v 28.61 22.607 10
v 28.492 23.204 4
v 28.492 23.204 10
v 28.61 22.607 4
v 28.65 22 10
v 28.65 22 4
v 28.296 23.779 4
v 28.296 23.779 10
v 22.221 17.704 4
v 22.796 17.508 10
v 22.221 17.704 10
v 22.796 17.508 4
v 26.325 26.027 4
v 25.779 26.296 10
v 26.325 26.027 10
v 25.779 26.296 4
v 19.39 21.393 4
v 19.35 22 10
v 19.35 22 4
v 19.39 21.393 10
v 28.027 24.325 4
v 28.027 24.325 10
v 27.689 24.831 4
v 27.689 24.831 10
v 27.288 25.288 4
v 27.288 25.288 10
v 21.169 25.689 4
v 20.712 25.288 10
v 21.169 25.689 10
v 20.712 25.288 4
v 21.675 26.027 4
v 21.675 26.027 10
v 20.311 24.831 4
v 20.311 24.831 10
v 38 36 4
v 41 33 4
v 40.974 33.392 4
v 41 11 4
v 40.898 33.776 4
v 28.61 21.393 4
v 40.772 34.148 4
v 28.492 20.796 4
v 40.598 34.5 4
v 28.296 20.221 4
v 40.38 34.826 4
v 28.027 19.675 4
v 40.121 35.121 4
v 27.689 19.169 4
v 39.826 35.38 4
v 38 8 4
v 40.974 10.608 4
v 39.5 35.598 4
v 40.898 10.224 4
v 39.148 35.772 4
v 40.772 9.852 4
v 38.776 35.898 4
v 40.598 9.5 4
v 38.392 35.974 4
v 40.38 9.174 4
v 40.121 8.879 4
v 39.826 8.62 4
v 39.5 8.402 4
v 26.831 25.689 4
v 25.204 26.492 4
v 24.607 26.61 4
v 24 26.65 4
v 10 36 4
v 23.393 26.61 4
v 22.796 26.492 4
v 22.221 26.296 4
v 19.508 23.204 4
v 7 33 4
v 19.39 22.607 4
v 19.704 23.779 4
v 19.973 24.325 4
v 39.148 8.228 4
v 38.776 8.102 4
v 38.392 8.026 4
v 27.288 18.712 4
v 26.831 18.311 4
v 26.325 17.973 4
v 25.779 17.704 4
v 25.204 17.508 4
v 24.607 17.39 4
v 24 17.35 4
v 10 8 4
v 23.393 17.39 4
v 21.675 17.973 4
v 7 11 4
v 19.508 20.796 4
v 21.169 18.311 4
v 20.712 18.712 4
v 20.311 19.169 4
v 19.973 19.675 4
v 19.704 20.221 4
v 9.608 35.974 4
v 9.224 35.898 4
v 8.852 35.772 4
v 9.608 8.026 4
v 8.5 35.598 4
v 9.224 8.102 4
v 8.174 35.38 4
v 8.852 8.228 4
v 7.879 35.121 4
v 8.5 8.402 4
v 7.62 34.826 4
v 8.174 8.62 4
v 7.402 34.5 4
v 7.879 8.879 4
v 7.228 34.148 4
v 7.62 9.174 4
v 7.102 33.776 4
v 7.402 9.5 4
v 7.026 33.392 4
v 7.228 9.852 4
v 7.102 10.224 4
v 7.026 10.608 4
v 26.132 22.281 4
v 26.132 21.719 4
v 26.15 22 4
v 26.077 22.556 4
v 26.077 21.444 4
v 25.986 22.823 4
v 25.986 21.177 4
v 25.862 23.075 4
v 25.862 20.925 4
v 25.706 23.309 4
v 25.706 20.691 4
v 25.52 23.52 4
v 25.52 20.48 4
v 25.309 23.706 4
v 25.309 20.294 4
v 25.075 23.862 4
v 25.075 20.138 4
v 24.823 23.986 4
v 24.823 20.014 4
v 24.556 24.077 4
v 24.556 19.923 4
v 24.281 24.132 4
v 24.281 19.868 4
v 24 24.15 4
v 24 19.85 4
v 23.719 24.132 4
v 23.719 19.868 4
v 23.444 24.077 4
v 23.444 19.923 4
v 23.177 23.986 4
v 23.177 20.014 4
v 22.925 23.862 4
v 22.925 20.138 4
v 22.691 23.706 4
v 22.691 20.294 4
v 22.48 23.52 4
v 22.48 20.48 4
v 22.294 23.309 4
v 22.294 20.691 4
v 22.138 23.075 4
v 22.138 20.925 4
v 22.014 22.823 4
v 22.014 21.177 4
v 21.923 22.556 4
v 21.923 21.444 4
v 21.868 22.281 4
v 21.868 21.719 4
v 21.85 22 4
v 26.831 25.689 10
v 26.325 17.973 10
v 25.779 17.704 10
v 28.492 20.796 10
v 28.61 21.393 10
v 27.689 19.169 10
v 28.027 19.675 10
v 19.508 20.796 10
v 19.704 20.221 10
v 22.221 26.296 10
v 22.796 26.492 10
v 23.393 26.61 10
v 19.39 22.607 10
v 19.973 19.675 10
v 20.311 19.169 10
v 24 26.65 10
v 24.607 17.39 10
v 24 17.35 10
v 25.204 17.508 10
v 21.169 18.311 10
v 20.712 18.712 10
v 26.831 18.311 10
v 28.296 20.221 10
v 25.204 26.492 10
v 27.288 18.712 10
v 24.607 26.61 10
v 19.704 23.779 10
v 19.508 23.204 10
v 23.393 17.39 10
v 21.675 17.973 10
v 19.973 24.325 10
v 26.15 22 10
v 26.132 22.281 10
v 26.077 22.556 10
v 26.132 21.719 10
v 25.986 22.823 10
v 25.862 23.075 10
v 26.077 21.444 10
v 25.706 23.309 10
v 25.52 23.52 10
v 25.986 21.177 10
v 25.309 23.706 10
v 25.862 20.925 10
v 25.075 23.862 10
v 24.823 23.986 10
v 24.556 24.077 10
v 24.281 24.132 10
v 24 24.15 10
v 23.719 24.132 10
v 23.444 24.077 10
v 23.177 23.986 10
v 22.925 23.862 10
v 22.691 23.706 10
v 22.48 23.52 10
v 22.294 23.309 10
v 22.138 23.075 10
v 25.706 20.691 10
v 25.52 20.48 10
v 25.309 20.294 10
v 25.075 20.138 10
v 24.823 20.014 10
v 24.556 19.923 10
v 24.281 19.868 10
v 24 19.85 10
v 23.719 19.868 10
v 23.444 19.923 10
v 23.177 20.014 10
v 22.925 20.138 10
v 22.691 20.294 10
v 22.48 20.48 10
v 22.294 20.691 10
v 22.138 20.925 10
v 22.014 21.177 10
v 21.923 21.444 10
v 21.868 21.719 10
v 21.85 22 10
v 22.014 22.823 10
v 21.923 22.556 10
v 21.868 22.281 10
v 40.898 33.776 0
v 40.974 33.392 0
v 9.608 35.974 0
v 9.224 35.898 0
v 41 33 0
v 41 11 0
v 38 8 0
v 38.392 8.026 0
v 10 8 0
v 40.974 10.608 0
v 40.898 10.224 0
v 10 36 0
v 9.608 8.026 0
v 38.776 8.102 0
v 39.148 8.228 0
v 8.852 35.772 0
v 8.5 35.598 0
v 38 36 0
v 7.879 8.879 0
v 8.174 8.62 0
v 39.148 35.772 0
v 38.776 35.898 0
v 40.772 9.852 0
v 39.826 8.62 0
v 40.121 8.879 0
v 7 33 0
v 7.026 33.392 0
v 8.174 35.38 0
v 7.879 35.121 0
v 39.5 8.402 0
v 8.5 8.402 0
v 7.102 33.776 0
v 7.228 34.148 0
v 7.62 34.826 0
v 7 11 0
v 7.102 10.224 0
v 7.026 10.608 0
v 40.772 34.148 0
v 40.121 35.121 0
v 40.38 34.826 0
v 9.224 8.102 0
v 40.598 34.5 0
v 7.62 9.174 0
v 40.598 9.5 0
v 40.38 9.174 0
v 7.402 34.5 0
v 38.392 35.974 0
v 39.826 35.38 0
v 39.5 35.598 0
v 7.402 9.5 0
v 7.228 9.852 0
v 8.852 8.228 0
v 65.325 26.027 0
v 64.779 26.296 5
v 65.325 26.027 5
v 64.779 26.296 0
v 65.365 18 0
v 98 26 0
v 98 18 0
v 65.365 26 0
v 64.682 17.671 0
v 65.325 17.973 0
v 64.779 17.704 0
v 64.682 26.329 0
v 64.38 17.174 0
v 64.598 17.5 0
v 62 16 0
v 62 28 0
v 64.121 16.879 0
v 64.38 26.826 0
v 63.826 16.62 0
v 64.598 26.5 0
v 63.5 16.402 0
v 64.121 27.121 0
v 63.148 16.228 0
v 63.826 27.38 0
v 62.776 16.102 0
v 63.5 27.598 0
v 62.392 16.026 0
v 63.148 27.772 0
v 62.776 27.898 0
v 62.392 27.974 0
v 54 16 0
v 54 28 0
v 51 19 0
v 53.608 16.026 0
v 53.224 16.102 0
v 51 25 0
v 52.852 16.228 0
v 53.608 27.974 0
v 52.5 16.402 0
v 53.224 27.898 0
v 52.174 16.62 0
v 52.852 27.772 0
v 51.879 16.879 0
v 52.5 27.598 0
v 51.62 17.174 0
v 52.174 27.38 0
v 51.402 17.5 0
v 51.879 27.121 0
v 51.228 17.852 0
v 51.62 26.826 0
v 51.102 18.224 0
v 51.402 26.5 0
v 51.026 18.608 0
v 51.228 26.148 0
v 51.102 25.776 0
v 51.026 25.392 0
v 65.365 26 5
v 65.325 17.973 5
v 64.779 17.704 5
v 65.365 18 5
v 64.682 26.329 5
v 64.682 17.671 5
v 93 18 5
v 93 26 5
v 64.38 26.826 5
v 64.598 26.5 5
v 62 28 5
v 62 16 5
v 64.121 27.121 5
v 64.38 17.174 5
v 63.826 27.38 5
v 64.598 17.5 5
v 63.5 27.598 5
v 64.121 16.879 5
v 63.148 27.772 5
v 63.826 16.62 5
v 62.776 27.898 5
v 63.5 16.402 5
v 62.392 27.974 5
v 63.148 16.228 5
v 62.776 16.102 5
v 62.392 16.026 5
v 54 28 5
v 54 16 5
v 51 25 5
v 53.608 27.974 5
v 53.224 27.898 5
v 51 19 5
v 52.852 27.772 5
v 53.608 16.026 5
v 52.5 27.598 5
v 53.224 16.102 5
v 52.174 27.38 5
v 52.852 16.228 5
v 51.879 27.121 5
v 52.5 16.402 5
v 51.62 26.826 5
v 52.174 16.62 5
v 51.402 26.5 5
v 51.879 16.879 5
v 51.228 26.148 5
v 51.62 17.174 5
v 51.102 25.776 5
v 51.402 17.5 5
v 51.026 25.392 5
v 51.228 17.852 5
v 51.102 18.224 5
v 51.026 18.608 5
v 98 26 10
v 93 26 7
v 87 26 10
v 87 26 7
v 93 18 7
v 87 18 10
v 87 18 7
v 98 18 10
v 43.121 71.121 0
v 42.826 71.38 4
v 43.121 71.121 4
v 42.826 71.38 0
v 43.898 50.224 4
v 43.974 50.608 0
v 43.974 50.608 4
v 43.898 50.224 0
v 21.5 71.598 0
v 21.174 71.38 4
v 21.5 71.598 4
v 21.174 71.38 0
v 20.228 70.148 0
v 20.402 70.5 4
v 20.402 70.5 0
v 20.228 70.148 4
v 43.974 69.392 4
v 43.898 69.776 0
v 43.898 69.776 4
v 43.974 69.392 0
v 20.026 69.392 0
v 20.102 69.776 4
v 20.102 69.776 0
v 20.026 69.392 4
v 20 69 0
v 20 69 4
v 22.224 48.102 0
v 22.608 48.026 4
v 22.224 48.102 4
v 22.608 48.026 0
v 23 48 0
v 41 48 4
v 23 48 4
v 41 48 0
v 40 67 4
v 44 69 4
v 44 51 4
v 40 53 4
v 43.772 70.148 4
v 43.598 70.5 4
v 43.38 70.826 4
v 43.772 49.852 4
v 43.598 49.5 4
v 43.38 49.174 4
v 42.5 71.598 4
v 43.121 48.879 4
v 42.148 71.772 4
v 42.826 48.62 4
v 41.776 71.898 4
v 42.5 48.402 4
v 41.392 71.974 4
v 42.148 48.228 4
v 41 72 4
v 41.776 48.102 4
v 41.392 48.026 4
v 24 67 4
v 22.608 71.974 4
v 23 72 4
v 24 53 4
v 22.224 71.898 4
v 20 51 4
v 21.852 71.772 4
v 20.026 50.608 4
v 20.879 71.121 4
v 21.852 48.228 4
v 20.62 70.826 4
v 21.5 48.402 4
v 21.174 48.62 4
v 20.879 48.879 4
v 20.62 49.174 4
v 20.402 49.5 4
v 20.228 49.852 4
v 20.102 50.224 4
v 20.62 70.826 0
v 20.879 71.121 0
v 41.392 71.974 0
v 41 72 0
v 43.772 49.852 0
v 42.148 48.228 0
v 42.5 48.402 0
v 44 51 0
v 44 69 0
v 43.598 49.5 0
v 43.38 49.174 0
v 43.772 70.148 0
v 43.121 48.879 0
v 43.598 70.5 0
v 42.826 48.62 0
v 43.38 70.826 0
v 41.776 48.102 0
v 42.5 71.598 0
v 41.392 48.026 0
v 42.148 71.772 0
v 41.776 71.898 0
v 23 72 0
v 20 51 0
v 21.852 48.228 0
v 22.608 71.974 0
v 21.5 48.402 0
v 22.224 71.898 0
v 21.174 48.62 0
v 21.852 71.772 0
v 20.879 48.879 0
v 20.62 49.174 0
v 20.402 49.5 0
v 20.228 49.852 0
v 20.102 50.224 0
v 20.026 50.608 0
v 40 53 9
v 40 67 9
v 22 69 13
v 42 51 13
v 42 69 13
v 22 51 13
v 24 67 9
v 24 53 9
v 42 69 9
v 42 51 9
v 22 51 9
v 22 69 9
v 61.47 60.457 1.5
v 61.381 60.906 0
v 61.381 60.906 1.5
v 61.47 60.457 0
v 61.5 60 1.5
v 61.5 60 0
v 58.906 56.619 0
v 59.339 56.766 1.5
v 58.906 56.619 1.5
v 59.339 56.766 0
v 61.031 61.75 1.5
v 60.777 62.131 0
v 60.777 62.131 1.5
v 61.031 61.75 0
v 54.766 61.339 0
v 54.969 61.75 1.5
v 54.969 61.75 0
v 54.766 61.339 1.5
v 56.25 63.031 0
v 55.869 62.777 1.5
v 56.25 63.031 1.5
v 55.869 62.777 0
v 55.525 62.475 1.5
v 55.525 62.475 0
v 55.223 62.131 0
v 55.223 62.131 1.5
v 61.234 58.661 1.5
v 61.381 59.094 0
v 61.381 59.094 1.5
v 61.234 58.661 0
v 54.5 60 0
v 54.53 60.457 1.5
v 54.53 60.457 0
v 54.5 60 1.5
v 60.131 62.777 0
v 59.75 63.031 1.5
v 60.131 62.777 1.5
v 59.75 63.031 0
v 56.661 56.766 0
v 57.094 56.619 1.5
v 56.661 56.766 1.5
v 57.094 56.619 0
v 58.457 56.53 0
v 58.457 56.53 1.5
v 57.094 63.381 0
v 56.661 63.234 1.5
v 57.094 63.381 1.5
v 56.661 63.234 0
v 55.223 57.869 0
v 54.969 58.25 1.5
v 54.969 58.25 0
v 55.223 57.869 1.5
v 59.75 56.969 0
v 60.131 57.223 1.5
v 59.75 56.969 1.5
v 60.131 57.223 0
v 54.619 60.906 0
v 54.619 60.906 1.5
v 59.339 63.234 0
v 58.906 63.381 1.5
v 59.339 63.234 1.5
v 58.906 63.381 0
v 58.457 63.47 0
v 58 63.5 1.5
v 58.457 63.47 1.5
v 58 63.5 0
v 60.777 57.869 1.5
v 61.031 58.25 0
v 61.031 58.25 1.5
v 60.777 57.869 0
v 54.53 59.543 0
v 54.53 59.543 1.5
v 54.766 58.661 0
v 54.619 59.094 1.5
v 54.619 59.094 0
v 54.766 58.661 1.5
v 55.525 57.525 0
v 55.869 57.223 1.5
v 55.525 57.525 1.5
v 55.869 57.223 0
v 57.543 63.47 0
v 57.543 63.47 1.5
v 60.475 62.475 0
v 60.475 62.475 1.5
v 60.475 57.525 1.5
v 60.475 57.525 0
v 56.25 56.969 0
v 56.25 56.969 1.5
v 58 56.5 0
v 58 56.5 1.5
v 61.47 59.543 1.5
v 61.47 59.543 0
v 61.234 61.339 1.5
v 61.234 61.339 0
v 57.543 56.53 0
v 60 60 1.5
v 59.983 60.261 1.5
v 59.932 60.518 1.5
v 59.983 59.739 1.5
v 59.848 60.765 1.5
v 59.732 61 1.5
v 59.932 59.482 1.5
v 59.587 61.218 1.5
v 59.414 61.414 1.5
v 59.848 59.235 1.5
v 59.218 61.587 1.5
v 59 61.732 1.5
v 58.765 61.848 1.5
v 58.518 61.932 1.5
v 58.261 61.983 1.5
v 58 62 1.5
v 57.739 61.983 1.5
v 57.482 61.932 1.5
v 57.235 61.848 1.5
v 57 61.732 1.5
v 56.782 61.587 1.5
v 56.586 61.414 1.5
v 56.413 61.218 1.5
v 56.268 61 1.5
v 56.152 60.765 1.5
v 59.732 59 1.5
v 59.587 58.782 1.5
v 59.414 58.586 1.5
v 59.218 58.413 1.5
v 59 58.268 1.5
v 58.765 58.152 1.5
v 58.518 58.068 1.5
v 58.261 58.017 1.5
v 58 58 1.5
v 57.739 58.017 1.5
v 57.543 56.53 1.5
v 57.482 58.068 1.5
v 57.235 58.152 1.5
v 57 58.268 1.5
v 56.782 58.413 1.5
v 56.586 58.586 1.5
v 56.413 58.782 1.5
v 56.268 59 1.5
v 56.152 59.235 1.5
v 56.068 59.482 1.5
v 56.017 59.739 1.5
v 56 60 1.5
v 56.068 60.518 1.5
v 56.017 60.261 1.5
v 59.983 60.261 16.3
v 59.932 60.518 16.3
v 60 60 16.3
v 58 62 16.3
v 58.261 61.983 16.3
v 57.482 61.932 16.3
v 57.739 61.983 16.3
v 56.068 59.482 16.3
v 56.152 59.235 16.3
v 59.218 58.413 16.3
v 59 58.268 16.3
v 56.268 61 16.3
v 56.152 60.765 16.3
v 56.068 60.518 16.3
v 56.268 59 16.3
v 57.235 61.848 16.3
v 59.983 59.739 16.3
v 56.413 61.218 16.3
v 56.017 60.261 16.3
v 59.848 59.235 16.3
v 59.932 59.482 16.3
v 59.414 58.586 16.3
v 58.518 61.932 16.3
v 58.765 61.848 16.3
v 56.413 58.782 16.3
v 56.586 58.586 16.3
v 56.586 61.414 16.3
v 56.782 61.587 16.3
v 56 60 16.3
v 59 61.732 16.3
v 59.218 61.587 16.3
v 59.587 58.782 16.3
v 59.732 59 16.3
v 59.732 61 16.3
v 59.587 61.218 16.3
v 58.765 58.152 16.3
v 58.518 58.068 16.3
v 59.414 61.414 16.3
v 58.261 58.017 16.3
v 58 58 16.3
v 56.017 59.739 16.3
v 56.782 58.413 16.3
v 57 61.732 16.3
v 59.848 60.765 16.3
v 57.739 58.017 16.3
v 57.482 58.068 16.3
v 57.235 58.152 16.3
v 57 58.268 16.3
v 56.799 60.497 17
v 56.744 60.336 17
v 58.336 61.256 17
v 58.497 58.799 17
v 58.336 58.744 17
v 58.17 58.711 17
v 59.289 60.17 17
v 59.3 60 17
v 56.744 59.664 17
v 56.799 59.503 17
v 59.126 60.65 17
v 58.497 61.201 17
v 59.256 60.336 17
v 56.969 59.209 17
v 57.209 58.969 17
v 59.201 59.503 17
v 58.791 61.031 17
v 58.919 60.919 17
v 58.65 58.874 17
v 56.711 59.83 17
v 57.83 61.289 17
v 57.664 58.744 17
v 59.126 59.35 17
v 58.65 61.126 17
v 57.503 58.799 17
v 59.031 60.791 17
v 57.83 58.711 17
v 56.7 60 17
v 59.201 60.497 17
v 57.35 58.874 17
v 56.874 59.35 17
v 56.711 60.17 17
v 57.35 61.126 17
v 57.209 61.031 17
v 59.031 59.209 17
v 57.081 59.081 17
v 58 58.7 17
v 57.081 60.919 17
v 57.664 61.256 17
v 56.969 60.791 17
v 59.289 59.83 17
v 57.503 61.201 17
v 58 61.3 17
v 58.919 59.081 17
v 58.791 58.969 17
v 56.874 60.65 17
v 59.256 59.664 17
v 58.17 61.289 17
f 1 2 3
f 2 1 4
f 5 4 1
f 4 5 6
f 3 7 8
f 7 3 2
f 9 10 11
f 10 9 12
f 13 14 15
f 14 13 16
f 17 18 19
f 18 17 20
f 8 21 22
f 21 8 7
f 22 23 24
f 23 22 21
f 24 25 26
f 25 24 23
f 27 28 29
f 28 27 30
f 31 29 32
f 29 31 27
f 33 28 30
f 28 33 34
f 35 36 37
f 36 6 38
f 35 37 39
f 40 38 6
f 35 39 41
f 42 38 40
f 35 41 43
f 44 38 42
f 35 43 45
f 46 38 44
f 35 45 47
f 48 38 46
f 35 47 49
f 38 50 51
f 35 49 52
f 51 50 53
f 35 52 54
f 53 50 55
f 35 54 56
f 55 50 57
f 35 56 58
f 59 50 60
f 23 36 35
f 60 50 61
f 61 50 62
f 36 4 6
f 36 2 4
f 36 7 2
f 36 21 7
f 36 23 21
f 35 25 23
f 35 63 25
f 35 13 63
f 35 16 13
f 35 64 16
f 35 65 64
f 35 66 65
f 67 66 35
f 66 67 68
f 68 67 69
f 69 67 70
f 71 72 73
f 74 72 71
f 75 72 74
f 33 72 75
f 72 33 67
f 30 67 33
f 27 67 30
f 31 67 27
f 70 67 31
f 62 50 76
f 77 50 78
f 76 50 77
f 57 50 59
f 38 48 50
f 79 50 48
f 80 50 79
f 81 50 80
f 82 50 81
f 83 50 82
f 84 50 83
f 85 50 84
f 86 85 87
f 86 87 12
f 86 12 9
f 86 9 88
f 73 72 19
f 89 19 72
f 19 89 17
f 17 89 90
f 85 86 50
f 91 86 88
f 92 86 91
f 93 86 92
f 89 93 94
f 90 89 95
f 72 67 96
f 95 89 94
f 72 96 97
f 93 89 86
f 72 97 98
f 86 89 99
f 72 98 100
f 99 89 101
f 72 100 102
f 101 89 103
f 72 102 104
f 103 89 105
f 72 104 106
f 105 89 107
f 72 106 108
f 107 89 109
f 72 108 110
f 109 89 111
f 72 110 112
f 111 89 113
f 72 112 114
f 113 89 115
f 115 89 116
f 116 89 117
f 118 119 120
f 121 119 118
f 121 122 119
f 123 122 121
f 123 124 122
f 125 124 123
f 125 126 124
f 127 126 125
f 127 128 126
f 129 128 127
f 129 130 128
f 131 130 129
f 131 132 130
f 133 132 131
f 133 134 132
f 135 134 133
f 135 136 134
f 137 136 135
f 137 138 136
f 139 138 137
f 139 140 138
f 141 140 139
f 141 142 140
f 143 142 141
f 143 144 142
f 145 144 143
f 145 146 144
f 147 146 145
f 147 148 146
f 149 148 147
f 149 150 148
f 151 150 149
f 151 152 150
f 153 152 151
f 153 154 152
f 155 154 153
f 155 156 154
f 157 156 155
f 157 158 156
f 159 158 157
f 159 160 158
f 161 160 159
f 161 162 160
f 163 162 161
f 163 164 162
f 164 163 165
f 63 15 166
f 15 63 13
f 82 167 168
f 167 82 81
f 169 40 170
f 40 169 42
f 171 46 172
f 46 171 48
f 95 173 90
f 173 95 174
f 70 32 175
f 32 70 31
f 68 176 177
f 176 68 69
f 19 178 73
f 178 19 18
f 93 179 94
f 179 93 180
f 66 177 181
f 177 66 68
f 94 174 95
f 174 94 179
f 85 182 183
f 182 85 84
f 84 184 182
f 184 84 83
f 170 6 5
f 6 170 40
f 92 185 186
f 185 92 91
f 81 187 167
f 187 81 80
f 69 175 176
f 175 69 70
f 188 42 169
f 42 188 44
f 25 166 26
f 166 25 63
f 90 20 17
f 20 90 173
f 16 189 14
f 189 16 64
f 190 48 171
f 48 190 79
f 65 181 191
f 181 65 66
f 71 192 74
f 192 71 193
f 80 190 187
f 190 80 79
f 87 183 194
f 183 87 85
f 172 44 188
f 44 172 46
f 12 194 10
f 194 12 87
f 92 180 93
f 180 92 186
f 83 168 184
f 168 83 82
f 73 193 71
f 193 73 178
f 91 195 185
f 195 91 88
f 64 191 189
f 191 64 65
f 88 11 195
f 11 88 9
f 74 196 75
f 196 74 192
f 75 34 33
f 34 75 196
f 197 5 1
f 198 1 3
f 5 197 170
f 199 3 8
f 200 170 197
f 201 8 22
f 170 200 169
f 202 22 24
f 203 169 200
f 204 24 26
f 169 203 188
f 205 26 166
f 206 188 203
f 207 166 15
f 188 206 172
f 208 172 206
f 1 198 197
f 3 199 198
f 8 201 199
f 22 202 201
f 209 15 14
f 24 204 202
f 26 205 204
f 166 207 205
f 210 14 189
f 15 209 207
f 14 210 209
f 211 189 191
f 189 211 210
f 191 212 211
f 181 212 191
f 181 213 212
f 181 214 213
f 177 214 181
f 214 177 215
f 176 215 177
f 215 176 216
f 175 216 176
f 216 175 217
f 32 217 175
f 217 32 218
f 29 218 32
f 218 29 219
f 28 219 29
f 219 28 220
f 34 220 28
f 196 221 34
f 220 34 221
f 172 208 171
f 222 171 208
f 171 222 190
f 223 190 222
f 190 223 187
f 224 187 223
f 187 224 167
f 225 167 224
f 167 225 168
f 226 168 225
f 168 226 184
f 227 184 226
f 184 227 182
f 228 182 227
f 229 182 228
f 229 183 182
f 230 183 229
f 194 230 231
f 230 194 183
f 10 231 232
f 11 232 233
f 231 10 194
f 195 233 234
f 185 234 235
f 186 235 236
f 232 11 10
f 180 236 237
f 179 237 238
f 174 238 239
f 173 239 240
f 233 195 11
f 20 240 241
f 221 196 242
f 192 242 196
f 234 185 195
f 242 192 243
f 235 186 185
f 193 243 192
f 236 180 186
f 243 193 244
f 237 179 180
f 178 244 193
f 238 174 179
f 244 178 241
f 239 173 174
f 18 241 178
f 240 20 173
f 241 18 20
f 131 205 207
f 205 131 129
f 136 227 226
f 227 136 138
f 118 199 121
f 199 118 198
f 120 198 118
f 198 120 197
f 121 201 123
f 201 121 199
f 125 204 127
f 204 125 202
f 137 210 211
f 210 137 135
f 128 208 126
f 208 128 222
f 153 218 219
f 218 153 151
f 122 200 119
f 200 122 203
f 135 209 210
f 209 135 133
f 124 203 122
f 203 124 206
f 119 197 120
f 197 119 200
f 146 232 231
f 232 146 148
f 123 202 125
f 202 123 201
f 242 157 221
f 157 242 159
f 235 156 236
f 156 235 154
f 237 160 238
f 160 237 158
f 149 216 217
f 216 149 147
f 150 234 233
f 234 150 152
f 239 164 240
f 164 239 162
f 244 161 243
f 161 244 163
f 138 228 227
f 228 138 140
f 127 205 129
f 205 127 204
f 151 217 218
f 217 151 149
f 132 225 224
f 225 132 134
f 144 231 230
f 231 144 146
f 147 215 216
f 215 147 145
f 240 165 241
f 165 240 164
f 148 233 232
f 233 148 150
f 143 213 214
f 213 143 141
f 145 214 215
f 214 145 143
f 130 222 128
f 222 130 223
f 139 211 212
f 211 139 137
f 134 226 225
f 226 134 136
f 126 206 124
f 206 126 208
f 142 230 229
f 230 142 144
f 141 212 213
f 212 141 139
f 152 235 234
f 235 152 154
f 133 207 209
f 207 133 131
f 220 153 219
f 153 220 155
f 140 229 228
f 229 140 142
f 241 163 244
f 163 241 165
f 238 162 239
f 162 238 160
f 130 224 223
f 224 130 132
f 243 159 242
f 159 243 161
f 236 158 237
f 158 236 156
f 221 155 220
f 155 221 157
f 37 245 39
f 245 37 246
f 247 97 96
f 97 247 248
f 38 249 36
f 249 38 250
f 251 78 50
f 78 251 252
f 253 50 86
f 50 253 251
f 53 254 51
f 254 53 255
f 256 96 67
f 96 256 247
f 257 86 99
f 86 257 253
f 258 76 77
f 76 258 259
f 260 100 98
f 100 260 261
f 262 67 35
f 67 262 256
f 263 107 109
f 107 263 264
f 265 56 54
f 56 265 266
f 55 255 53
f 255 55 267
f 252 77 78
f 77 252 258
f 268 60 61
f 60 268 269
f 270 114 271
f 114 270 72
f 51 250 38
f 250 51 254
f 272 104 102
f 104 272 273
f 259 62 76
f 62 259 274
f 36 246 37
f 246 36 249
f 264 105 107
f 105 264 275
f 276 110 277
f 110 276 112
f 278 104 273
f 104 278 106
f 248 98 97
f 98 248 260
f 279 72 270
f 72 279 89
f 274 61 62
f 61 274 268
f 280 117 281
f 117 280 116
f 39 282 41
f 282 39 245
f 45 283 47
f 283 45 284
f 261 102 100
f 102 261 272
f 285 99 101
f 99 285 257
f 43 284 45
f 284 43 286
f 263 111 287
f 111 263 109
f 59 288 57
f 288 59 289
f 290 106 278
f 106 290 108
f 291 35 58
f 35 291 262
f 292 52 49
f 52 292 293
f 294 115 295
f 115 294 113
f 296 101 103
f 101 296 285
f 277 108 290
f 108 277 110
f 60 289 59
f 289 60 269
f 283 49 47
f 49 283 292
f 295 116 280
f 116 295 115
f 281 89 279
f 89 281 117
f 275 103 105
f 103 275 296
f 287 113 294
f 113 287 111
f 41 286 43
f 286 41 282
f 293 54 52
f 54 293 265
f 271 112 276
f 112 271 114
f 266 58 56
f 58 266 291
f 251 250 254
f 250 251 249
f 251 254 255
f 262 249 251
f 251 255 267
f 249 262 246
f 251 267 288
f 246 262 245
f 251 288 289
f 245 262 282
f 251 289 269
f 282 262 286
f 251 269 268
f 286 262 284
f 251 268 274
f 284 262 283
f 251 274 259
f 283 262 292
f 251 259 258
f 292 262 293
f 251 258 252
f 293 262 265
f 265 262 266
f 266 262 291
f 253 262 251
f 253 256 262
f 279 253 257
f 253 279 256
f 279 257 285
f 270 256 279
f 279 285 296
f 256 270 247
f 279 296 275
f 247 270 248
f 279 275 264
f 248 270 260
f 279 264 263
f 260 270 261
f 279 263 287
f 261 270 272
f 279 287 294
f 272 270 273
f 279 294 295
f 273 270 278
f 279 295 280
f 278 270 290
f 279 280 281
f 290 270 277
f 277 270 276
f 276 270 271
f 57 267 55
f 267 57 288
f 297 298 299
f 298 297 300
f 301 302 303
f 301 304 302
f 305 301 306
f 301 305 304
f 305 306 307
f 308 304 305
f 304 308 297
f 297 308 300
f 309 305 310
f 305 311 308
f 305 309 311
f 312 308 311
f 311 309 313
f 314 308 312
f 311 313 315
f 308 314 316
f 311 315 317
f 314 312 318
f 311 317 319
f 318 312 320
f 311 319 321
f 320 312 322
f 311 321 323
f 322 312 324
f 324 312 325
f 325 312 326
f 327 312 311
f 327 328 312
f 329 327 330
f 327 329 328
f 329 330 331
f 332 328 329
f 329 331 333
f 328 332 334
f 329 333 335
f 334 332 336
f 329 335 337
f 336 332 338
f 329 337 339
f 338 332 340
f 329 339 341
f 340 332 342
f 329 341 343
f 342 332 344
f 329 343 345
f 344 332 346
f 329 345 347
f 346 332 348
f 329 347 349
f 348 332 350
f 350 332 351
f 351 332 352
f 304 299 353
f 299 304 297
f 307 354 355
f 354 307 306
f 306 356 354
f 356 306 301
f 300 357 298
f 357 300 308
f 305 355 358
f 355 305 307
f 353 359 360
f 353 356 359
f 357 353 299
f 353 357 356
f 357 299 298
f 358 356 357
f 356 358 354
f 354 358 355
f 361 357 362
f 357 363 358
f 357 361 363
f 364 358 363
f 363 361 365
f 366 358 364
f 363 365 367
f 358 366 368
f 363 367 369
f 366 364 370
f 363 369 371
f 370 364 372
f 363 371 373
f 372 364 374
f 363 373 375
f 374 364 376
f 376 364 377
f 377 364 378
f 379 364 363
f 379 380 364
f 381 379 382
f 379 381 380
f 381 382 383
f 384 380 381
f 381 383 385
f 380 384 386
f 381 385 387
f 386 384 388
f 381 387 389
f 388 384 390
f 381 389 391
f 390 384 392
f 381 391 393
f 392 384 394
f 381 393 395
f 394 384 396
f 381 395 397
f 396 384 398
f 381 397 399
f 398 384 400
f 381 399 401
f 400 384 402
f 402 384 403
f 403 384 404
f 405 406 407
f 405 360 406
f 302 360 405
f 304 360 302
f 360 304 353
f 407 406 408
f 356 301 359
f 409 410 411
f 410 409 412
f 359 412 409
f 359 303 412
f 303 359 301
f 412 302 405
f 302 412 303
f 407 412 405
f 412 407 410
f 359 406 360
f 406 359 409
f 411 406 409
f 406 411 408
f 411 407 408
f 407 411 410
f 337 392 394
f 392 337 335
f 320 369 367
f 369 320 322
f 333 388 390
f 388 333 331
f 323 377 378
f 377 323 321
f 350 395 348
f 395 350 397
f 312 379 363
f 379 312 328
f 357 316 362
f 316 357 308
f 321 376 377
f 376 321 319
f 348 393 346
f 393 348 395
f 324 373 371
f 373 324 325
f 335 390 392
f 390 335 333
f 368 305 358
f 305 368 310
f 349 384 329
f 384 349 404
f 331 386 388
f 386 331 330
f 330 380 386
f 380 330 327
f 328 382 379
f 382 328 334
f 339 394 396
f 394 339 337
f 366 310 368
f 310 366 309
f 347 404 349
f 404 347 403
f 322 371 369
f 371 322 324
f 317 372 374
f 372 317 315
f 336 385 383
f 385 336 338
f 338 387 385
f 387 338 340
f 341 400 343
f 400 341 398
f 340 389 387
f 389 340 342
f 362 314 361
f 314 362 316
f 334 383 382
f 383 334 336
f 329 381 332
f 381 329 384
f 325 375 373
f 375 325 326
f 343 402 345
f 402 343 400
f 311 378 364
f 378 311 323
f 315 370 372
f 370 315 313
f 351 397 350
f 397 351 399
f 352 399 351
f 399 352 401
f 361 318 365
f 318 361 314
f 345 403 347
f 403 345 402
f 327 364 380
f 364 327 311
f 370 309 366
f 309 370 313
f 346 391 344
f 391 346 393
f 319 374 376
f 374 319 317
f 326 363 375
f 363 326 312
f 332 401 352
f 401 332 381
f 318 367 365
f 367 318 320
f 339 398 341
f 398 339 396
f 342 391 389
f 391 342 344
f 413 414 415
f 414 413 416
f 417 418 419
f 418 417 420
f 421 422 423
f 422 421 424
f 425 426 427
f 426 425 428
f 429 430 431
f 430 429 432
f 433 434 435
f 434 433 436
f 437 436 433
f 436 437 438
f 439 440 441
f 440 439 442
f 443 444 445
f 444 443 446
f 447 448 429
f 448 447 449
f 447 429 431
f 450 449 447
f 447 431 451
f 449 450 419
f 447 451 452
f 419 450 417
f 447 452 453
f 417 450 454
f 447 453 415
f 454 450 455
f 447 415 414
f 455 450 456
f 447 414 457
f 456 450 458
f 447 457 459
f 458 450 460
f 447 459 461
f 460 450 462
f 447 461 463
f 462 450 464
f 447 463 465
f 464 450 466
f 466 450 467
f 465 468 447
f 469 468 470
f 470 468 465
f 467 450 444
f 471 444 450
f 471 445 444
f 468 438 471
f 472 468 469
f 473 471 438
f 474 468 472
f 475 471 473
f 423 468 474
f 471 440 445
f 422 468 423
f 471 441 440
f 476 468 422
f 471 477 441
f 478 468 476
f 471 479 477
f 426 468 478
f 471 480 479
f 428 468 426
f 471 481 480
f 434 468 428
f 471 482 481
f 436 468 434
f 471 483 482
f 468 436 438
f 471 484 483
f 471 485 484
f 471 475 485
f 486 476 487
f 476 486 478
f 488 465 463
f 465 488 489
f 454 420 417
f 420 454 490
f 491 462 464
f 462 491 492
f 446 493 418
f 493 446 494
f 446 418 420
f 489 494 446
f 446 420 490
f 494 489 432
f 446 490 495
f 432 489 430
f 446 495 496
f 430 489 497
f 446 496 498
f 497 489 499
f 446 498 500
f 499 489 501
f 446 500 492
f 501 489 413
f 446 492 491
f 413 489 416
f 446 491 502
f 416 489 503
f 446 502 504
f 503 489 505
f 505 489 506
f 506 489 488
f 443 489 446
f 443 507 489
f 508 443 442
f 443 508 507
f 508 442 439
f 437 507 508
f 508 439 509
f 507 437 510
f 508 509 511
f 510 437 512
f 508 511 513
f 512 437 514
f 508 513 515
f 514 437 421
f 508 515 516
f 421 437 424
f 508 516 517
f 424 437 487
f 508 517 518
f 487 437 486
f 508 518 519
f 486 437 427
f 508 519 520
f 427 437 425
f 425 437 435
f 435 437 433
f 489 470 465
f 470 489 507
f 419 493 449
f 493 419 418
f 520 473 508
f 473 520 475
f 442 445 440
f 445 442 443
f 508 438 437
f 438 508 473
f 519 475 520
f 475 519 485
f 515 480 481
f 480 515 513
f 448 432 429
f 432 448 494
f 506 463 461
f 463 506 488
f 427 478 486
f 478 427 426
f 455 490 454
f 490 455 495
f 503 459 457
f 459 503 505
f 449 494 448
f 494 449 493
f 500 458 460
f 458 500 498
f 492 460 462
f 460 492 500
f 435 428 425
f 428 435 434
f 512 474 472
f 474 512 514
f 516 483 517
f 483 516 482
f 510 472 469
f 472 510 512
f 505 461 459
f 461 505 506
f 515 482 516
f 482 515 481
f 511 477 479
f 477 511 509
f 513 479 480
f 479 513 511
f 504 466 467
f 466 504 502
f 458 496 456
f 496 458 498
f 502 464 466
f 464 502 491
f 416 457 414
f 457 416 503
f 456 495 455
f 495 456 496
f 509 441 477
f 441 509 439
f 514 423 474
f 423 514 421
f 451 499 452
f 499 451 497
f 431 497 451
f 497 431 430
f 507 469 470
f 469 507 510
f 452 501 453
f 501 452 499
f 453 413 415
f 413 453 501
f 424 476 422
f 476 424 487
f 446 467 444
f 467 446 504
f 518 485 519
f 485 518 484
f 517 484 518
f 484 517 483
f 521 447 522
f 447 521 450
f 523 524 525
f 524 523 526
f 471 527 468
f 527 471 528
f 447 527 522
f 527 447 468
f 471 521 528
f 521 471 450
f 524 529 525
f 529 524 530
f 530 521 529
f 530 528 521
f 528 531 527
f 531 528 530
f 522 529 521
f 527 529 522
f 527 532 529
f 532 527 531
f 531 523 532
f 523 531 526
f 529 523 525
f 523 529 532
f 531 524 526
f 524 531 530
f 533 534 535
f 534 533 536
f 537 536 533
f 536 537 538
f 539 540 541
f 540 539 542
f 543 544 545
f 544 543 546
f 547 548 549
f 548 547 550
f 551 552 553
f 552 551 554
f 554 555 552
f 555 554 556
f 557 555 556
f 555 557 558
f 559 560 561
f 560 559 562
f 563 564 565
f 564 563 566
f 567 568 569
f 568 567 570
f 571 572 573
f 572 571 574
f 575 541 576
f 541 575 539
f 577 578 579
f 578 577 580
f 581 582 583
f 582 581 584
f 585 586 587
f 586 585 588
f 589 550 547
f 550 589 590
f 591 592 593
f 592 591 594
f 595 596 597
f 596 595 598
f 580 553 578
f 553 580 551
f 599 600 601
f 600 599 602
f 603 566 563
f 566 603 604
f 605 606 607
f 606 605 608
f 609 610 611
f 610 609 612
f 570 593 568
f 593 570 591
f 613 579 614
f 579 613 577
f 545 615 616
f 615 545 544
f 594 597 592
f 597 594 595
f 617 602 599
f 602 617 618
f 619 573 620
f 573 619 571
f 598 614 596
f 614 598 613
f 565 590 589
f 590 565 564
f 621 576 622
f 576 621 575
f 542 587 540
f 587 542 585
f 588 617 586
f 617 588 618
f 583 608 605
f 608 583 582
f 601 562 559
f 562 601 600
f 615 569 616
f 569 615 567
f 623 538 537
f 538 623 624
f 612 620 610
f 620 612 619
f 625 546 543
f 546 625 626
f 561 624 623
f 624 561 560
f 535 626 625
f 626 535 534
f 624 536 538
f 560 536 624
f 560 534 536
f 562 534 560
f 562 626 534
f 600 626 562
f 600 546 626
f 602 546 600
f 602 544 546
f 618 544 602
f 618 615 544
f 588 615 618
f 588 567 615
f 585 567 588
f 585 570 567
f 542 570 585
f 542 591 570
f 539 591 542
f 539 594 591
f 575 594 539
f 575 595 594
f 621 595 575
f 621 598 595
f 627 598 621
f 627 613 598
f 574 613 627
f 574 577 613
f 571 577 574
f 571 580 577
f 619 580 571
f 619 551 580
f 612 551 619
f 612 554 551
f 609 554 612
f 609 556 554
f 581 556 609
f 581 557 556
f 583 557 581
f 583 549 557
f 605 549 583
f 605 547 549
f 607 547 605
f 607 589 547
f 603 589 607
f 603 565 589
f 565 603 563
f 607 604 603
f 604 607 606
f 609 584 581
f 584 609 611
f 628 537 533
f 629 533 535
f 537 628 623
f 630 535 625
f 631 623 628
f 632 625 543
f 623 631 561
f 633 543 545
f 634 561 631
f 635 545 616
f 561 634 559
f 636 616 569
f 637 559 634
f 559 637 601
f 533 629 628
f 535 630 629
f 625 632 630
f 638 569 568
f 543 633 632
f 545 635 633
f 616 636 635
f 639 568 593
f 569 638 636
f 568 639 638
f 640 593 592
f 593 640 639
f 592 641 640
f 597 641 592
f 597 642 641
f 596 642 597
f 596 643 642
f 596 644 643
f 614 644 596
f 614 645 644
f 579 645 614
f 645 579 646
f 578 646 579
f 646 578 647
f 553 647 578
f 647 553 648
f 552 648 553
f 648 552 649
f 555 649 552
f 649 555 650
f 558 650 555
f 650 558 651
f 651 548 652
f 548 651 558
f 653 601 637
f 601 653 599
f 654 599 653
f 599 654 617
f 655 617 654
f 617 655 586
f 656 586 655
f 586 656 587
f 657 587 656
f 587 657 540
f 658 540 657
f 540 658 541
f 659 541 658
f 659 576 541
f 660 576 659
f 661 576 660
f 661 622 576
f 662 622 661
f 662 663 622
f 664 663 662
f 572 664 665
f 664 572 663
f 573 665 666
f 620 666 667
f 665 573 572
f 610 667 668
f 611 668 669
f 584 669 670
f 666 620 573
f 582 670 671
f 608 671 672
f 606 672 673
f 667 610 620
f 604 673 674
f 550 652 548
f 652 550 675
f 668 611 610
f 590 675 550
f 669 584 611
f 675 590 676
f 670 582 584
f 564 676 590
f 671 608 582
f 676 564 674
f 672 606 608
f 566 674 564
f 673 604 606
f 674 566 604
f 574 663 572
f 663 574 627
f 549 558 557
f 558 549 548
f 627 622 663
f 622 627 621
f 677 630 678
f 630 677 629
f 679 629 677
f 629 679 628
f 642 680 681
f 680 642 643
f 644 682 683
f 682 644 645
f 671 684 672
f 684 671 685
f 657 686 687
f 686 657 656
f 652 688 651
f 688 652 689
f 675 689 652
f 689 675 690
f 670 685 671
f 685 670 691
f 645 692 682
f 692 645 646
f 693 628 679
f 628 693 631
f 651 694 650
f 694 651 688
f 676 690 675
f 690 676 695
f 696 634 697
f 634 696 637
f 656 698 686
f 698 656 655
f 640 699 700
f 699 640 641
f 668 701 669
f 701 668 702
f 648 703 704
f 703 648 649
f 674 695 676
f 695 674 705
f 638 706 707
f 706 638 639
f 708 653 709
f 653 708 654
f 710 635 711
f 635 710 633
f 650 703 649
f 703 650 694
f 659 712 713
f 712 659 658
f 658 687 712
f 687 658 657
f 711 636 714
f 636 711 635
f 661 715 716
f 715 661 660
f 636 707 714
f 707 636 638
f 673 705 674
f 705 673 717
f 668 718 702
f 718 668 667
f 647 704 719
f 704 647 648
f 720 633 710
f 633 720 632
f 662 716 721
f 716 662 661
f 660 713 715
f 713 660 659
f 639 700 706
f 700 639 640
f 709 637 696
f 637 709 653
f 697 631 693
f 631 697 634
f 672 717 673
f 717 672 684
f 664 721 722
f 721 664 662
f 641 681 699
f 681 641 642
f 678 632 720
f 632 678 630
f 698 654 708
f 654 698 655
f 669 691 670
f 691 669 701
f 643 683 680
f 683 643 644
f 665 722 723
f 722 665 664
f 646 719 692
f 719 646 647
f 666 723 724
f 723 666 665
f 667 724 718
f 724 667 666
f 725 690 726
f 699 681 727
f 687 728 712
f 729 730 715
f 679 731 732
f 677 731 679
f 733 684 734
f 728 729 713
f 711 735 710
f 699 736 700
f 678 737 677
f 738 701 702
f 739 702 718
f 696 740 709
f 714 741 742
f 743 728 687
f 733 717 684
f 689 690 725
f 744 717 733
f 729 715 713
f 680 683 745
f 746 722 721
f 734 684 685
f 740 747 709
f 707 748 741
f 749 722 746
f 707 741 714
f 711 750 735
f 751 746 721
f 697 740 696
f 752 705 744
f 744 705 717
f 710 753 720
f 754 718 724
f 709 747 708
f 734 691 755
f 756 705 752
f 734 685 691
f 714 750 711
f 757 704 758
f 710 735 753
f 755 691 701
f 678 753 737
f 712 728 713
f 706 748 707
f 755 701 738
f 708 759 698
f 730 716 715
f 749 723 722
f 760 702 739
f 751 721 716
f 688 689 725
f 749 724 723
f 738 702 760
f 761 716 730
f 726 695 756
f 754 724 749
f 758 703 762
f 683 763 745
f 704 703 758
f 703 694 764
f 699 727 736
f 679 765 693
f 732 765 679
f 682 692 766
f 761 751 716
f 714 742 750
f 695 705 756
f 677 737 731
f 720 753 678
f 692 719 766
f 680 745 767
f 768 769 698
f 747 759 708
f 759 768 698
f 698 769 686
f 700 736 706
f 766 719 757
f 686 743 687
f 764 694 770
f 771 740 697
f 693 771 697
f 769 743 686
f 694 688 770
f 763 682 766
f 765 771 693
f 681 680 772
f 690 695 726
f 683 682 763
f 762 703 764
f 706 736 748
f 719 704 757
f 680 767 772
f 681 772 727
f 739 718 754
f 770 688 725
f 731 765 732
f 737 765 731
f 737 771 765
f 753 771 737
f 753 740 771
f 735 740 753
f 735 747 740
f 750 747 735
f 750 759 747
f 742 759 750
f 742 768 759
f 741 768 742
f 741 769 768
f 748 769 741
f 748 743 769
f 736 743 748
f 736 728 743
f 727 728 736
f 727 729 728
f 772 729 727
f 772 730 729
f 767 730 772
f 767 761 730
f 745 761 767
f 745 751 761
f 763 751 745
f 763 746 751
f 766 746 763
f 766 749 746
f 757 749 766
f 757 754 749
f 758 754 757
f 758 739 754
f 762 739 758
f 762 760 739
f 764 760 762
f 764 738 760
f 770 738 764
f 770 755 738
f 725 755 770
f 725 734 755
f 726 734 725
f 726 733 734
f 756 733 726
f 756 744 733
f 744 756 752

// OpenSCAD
/*
Sample 073: Drehhakenverschluss — 0,15 mm
Generated from the FDM Mechanical Sample Library.
Units: millimetres.

Override examples:
  openscad -o custom.stl -D 'view="plate"' -D 'render_fn=64' model.scad
  openscad -o preview.png -D 'view="assembly"' model.scad
*/
use <../../../library/fdm_mechanisms.scad>

render_fn = is_undef(render_fn) ? 48 : render_fn;
view = is_undef(view) ? "plate" : view;
$fn = render_fn;

sample_hook_latch(
    view=view,
    pin_d=4,
    clearance=0.15,
    arm=34
);
